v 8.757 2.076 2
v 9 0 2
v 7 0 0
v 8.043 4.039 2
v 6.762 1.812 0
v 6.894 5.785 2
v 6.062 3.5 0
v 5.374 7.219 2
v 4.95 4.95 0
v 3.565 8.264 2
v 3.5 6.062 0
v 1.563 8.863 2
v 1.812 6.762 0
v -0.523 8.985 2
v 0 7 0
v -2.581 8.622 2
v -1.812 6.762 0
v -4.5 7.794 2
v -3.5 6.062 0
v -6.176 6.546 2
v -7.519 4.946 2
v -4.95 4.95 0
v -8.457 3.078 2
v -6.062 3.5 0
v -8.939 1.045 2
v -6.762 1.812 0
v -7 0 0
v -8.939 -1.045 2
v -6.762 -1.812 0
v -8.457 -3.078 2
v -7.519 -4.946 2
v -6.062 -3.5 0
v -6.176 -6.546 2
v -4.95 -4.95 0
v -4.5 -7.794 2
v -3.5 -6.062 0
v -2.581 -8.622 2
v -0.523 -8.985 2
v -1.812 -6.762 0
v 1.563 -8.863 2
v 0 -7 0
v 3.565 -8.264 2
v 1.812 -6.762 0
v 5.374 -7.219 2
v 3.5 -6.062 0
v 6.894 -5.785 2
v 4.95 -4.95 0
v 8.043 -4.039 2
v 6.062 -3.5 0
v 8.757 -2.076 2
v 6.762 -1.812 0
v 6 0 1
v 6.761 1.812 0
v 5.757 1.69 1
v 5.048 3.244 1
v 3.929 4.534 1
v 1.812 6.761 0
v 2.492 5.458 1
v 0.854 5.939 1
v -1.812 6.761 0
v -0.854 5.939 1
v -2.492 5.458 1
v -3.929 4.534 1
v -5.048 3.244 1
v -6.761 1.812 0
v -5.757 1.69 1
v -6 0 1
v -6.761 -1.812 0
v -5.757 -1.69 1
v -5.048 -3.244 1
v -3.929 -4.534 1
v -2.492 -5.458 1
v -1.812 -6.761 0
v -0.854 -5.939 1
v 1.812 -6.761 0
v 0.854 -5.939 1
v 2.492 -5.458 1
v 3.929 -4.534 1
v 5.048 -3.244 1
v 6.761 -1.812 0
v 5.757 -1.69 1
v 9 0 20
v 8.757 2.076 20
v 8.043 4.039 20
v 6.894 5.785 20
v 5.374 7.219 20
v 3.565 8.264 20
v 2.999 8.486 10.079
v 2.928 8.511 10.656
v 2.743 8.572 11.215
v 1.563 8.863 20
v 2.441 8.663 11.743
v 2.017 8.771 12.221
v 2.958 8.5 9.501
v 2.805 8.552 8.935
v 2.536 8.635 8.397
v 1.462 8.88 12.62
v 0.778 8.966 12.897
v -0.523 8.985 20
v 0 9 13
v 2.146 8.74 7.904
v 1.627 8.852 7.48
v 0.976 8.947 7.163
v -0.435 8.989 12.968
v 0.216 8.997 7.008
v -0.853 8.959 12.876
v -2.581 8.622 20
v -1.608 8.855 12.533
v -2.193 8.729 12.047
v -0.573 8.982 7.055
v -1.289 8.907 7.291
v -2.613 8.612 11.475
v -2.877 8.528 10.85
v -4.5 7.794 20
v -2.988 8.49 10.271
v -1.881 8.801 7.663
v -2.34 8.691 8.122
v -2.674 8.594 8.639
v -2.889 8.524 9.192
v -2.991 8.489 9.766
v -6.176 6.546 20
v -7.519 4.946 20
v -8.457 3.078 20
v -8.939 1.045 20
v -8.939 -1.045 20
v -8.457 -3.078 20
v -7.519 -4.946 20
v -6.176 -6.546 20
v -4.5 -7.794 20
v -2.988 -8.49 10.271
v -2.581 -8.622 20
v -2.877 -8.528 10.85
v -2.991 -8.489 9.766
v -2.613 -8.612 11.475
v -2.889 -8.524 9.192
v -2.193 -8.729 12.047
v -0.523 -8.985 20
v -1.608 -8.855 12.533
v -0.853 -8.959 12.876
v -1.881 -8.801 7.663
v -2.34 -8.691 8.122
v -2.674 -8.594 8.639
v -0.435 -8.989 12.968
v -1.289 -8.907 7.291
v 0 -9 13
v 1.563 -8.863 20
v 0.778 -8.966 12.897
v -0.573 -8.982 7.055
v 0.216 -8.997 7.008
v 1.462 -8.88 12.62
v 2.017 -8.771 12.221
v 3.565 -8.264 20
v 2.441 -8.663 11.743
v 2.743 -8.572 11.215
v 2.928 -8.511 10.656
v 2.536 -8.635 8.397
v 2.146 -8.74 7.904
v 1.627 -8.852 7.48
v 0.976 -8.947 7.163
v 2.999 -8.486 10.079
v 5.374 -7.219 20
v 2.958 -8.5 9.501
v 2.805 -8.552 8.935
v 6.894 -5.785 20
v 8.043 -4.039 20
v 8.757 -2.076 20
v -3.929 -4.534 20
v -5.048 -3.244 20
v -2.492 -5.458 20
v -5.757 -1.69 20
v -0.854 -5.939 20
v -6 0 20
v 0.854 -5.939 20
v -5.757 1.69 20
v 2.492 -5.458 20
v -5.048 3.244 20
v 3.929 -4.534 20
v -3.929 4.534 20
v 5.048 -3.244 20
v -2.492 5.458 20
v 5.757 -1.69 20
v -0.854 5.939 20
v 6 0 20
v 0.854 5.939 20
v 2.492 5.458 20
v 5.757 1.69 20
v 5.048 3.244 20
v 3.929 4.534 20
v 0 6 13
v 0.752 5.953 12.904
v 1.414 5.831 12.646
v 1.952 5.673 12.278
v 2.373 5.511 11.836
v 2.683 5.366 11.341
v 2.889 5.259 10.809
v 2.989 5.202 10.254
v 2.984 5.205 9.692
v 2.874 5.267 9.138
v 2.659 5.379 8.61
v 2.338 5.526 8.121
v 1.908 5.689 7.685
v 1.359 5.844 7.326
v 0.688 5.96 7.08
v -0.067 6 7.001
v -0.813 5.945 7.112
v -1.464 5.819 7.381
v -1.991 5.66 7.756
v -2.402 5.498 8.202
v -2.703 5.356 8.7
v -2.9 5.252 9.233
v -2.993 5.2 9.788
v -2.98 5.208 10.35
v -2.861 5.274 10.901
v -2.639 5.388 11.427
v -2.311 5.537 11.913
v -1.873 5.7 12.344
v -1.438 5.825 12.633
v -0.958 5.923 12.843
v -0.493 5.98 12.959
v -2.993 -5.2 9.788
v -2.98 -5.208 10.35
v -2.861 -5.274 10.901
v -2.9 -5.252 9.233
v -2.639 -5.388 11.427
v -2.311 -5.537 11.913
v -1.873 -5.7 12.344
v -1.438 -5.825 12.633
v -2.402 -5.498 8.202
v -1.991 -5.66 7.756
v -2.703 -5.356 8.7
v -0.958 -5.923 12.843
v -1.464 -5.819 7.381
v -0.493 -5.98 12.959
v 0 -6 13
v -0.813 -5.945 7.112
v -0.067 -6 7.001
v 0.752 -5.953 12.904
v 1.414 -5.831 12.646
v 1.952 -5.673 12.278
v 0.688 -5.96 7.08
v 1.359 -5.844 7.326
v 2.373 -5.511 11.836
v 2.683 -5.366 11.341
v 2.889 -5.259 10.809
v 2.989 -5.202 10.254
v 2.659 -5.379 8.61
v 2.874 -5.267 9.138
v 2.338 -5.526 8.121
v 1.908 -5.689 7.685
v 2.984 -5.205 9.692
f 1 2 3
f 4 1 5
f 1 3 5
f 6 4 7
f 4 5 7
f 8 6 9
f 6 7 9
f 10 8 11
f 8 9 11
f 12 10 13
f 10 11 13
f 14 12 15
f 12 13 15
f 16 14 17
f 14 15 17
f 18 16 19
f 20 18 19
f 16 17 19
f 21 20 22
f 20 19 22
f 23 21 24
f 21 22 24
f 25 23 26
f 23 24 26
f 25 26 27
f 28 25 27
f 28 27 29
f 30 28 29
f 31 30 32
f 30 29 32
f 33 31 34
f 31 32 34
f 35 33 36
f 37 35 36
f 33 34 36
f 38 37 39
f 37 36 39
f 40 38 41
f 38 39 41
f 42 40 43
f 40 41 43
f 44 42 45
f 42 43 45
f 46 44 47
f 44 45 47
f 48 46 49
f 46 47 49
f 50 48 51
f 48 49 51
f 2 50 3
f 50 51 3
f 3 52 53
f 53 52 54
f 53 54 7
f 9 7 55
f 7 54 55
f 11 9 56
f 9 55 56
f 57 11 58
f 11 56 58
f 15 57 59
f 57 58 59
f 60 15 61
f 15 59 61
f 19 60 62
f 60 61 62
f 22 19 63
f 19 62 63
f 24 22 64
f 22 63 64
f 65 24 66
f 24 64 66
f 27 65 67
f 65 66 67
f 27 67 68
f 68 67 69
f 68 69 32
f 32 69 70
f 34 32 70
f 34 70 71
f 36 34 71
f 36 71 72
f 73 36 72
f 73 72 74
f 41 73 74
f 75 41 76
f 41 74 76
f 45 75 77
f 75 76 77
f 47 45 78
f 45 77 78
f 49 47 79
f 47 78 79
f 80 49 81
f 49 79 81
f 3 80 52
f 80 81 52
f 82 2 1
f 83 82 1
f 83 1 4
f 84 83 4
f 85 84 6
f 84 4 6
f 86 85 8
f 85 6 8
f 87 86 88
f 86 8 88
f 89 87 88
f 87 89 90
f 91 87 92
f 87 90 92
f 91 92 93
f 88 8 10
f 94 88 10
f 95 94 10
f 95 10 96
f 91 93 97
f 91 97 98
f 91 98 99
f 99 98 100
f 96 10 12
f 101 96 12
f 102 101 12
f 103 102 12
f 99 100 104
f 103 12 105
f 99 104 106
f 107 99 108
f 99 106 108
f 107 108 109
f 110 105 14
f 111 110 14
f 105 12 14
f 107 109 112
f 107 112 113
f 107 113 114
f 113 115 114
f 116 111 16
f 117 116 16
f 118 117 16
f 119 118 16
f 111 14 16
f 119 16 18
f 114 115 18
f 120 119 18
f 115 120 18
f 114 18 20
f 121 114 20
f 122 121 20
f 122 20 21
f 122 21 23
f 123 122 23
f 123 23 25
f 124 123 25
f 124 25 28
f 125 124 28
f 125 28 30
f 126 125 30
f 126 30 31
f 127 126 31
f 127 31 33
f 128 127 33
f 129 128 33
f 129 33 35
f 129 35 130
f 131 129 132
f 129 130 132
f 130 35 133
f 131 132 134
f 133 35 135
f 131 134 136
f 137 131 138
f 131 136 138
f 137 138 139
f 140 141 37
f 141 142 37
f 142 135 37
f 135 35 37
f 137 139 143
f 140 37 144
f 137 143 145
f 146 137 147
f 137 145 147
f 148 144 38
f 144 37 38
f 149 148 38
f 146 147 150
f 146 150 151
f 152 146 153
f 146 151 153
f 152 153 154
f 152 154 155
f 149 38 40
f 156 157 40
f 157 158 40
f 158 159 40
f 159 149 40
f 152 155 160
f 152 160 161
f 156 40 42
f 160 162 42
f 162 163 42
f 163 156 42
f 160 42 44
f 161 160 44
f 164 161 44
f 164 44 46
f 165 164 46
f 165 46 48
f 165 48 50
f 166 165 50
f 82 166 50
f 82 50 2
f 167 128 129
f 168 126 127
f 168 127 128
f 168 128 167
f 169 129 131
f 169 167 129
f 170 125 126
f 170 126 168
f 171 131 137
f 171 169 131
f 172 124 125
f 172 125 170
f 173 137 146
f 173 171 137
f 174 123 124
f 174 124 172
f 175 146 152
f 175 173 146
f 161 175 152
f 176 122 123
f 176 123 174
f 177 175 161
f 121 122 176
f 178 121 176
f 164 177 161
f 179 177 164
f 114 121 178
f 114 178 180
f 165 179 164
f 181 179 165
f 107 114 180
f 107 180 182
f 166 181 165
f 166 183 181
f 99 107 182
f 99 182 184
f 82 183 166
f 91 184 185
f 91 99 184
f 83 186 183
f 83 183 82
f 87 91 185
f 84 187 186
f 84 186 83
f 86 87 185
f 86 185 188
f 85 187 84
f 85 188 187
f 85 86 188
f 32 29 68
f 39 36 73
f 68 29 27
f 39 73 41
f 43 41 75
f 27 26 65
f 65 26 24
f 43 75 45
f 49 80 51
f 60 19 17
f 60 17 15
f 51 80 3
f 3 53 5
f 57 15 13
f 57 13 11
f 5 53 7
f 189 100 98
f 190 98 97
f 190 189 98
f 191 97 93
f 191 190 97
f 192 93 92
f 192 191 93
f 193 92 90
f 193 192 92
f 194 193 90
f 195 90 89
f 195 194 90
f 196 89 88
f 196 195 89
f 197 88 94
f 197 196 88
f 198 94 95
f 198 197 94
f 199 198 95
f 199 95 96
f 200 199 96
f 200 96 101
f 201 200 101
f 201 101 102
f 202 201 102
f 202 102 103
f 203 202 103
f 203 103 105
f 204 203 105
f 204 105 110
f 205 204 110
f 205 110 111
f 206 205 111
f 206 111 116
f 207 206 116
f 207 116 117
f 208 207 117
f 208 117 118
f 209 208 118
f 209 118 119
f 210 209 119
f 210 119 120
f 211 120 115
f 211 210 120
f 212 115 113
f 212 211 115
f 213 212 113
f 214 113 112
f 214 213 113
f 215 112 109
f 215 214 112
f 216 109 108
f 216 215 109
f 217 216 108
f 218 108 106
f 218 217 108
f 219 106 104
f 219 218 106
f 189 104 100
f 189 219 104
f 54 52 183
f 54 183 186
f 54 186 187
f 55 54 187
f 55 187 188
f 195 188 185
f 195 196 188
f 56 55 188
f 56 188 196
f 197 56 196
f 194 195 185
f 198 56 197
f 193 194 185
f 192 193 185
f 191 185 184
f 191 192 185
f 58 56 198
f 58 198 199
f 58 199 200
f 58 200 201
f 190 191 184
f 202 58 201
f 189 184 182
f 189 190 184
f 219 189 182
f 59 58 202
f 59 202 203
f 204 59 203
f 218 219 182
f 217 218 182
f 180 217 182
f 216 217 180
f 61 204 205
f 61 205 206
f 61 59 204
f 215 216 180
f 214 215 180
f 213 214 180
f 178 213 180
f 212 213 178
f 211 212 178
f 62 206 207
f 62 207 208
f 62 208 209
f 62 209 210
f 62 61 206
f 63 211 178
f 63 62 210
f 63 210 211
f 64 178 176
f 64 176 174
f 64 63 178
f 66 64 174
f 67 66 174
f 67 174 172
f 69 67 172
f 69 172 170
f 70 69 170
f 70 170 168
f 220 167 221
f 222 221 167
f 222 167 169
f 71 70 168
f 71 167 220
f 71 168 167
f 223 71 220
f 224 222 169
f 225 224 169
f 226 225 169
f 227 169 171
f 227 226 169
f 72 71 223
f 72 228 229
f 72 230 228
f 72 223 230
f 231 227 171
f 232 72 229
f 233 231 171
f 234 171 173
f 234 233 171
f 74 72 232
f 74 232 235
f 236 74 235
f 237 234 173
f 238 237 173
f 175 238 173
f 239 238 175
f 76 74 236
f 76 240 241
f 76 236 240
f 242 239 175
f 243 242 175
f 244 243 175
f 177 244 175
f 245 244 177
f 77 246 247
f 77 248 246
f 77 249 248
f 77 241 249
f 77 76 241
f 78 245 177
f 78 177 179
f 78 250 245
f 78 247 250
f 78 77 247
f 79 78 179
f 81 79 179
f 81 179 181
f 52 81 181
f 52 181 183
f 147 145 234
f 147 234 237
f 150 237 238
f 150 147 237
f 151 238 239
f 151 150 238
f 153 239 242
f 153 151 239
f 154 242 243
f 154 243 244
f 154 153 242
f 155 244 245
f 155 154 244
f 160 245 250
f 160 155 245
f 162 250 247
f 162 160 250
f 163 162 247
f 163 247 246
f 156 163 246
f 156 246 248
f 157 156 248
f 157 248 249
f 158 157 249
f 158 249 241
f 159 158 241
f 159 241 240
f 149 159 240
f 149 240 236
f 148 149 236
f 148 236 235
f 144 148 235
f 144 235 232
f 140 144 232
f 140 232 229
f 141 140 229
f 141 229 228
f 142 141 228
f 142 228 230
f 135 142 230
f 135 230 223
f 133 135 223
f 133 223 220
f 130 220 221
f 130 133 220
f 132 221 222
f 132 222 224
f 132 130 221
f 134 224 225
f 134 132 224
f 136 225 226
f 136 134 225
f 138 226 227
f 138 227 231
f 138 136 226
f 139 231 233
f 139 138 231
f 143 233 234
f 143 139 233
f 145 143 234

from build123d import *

# Parameters (mm, degrees)
ESQUISSE1_R                  = 9
ESQUISSE1_R_2                = 6
BASE_EXTRUSION_DEPTH         = 20
CHANFREIN1_SIZE              = 2
ENL_V_MAT_EXTRU_1_DEPTH      = 20
ENL_V_MAT_EXTRU_1_DEPTH_BACK = 24.706539182
ESQUISSE2_R                  = 3
CHANFREIN2_SIZE              = 1


with BuildPart() as part:
    # Esquisse1 → Base-Extrusion (new body)
    with BuildSketch(Plane.XY):
        Circle(ESQUISSE1_R)
        Circle(ESQUISSE1_R_2, mode=Mode.SUBTRACT)
    extrude(amount=BASE_EXTRUSION_DEPTH)

    # Chanfrein1
    chanfrein1_edges = [part.edges().sort_by_distance(p)[0] for p in [
        (-9, 0, 0),
    ]]
    chamfer(chanfrein1_edges, length=CHANFREIN1_SIZE - 0.0001)  # a hair under: the kernel refuses the full size

    # Esquisse2 → Enlèv. mat.-Extru.1 (cut, two sides: drawn at the far end of the back side and taken through both)
    with BuildSketch(Plane(origin=(0, 0, 0), x_dir=(1, 0, 0), z_dir=(0, 1, 0)).offset(-ENL_V_MAT_EXTRU_1_DEPTH_BACK)):
        with Locations(Location((0, -10, 0), (0, 0, 270))):
            Circle(ESQUISSE2_R)
    extrude(amount=ENL_V_MAT_EXTRU_1_DEPTH + ENL_V_MAT_EXTRU_1_DEPTH_BACK, mode=Mode.SUBTRACT)

    # Chanfrein2
    chanfrein2_edges = [part.edges().sort_by_distance(p)[0] for p in [
        (-6, 0, 0),
    ]]
    chamfer(chanfrein2_edges, length=CHANFREIN2_SIZE)


solid = part.part
